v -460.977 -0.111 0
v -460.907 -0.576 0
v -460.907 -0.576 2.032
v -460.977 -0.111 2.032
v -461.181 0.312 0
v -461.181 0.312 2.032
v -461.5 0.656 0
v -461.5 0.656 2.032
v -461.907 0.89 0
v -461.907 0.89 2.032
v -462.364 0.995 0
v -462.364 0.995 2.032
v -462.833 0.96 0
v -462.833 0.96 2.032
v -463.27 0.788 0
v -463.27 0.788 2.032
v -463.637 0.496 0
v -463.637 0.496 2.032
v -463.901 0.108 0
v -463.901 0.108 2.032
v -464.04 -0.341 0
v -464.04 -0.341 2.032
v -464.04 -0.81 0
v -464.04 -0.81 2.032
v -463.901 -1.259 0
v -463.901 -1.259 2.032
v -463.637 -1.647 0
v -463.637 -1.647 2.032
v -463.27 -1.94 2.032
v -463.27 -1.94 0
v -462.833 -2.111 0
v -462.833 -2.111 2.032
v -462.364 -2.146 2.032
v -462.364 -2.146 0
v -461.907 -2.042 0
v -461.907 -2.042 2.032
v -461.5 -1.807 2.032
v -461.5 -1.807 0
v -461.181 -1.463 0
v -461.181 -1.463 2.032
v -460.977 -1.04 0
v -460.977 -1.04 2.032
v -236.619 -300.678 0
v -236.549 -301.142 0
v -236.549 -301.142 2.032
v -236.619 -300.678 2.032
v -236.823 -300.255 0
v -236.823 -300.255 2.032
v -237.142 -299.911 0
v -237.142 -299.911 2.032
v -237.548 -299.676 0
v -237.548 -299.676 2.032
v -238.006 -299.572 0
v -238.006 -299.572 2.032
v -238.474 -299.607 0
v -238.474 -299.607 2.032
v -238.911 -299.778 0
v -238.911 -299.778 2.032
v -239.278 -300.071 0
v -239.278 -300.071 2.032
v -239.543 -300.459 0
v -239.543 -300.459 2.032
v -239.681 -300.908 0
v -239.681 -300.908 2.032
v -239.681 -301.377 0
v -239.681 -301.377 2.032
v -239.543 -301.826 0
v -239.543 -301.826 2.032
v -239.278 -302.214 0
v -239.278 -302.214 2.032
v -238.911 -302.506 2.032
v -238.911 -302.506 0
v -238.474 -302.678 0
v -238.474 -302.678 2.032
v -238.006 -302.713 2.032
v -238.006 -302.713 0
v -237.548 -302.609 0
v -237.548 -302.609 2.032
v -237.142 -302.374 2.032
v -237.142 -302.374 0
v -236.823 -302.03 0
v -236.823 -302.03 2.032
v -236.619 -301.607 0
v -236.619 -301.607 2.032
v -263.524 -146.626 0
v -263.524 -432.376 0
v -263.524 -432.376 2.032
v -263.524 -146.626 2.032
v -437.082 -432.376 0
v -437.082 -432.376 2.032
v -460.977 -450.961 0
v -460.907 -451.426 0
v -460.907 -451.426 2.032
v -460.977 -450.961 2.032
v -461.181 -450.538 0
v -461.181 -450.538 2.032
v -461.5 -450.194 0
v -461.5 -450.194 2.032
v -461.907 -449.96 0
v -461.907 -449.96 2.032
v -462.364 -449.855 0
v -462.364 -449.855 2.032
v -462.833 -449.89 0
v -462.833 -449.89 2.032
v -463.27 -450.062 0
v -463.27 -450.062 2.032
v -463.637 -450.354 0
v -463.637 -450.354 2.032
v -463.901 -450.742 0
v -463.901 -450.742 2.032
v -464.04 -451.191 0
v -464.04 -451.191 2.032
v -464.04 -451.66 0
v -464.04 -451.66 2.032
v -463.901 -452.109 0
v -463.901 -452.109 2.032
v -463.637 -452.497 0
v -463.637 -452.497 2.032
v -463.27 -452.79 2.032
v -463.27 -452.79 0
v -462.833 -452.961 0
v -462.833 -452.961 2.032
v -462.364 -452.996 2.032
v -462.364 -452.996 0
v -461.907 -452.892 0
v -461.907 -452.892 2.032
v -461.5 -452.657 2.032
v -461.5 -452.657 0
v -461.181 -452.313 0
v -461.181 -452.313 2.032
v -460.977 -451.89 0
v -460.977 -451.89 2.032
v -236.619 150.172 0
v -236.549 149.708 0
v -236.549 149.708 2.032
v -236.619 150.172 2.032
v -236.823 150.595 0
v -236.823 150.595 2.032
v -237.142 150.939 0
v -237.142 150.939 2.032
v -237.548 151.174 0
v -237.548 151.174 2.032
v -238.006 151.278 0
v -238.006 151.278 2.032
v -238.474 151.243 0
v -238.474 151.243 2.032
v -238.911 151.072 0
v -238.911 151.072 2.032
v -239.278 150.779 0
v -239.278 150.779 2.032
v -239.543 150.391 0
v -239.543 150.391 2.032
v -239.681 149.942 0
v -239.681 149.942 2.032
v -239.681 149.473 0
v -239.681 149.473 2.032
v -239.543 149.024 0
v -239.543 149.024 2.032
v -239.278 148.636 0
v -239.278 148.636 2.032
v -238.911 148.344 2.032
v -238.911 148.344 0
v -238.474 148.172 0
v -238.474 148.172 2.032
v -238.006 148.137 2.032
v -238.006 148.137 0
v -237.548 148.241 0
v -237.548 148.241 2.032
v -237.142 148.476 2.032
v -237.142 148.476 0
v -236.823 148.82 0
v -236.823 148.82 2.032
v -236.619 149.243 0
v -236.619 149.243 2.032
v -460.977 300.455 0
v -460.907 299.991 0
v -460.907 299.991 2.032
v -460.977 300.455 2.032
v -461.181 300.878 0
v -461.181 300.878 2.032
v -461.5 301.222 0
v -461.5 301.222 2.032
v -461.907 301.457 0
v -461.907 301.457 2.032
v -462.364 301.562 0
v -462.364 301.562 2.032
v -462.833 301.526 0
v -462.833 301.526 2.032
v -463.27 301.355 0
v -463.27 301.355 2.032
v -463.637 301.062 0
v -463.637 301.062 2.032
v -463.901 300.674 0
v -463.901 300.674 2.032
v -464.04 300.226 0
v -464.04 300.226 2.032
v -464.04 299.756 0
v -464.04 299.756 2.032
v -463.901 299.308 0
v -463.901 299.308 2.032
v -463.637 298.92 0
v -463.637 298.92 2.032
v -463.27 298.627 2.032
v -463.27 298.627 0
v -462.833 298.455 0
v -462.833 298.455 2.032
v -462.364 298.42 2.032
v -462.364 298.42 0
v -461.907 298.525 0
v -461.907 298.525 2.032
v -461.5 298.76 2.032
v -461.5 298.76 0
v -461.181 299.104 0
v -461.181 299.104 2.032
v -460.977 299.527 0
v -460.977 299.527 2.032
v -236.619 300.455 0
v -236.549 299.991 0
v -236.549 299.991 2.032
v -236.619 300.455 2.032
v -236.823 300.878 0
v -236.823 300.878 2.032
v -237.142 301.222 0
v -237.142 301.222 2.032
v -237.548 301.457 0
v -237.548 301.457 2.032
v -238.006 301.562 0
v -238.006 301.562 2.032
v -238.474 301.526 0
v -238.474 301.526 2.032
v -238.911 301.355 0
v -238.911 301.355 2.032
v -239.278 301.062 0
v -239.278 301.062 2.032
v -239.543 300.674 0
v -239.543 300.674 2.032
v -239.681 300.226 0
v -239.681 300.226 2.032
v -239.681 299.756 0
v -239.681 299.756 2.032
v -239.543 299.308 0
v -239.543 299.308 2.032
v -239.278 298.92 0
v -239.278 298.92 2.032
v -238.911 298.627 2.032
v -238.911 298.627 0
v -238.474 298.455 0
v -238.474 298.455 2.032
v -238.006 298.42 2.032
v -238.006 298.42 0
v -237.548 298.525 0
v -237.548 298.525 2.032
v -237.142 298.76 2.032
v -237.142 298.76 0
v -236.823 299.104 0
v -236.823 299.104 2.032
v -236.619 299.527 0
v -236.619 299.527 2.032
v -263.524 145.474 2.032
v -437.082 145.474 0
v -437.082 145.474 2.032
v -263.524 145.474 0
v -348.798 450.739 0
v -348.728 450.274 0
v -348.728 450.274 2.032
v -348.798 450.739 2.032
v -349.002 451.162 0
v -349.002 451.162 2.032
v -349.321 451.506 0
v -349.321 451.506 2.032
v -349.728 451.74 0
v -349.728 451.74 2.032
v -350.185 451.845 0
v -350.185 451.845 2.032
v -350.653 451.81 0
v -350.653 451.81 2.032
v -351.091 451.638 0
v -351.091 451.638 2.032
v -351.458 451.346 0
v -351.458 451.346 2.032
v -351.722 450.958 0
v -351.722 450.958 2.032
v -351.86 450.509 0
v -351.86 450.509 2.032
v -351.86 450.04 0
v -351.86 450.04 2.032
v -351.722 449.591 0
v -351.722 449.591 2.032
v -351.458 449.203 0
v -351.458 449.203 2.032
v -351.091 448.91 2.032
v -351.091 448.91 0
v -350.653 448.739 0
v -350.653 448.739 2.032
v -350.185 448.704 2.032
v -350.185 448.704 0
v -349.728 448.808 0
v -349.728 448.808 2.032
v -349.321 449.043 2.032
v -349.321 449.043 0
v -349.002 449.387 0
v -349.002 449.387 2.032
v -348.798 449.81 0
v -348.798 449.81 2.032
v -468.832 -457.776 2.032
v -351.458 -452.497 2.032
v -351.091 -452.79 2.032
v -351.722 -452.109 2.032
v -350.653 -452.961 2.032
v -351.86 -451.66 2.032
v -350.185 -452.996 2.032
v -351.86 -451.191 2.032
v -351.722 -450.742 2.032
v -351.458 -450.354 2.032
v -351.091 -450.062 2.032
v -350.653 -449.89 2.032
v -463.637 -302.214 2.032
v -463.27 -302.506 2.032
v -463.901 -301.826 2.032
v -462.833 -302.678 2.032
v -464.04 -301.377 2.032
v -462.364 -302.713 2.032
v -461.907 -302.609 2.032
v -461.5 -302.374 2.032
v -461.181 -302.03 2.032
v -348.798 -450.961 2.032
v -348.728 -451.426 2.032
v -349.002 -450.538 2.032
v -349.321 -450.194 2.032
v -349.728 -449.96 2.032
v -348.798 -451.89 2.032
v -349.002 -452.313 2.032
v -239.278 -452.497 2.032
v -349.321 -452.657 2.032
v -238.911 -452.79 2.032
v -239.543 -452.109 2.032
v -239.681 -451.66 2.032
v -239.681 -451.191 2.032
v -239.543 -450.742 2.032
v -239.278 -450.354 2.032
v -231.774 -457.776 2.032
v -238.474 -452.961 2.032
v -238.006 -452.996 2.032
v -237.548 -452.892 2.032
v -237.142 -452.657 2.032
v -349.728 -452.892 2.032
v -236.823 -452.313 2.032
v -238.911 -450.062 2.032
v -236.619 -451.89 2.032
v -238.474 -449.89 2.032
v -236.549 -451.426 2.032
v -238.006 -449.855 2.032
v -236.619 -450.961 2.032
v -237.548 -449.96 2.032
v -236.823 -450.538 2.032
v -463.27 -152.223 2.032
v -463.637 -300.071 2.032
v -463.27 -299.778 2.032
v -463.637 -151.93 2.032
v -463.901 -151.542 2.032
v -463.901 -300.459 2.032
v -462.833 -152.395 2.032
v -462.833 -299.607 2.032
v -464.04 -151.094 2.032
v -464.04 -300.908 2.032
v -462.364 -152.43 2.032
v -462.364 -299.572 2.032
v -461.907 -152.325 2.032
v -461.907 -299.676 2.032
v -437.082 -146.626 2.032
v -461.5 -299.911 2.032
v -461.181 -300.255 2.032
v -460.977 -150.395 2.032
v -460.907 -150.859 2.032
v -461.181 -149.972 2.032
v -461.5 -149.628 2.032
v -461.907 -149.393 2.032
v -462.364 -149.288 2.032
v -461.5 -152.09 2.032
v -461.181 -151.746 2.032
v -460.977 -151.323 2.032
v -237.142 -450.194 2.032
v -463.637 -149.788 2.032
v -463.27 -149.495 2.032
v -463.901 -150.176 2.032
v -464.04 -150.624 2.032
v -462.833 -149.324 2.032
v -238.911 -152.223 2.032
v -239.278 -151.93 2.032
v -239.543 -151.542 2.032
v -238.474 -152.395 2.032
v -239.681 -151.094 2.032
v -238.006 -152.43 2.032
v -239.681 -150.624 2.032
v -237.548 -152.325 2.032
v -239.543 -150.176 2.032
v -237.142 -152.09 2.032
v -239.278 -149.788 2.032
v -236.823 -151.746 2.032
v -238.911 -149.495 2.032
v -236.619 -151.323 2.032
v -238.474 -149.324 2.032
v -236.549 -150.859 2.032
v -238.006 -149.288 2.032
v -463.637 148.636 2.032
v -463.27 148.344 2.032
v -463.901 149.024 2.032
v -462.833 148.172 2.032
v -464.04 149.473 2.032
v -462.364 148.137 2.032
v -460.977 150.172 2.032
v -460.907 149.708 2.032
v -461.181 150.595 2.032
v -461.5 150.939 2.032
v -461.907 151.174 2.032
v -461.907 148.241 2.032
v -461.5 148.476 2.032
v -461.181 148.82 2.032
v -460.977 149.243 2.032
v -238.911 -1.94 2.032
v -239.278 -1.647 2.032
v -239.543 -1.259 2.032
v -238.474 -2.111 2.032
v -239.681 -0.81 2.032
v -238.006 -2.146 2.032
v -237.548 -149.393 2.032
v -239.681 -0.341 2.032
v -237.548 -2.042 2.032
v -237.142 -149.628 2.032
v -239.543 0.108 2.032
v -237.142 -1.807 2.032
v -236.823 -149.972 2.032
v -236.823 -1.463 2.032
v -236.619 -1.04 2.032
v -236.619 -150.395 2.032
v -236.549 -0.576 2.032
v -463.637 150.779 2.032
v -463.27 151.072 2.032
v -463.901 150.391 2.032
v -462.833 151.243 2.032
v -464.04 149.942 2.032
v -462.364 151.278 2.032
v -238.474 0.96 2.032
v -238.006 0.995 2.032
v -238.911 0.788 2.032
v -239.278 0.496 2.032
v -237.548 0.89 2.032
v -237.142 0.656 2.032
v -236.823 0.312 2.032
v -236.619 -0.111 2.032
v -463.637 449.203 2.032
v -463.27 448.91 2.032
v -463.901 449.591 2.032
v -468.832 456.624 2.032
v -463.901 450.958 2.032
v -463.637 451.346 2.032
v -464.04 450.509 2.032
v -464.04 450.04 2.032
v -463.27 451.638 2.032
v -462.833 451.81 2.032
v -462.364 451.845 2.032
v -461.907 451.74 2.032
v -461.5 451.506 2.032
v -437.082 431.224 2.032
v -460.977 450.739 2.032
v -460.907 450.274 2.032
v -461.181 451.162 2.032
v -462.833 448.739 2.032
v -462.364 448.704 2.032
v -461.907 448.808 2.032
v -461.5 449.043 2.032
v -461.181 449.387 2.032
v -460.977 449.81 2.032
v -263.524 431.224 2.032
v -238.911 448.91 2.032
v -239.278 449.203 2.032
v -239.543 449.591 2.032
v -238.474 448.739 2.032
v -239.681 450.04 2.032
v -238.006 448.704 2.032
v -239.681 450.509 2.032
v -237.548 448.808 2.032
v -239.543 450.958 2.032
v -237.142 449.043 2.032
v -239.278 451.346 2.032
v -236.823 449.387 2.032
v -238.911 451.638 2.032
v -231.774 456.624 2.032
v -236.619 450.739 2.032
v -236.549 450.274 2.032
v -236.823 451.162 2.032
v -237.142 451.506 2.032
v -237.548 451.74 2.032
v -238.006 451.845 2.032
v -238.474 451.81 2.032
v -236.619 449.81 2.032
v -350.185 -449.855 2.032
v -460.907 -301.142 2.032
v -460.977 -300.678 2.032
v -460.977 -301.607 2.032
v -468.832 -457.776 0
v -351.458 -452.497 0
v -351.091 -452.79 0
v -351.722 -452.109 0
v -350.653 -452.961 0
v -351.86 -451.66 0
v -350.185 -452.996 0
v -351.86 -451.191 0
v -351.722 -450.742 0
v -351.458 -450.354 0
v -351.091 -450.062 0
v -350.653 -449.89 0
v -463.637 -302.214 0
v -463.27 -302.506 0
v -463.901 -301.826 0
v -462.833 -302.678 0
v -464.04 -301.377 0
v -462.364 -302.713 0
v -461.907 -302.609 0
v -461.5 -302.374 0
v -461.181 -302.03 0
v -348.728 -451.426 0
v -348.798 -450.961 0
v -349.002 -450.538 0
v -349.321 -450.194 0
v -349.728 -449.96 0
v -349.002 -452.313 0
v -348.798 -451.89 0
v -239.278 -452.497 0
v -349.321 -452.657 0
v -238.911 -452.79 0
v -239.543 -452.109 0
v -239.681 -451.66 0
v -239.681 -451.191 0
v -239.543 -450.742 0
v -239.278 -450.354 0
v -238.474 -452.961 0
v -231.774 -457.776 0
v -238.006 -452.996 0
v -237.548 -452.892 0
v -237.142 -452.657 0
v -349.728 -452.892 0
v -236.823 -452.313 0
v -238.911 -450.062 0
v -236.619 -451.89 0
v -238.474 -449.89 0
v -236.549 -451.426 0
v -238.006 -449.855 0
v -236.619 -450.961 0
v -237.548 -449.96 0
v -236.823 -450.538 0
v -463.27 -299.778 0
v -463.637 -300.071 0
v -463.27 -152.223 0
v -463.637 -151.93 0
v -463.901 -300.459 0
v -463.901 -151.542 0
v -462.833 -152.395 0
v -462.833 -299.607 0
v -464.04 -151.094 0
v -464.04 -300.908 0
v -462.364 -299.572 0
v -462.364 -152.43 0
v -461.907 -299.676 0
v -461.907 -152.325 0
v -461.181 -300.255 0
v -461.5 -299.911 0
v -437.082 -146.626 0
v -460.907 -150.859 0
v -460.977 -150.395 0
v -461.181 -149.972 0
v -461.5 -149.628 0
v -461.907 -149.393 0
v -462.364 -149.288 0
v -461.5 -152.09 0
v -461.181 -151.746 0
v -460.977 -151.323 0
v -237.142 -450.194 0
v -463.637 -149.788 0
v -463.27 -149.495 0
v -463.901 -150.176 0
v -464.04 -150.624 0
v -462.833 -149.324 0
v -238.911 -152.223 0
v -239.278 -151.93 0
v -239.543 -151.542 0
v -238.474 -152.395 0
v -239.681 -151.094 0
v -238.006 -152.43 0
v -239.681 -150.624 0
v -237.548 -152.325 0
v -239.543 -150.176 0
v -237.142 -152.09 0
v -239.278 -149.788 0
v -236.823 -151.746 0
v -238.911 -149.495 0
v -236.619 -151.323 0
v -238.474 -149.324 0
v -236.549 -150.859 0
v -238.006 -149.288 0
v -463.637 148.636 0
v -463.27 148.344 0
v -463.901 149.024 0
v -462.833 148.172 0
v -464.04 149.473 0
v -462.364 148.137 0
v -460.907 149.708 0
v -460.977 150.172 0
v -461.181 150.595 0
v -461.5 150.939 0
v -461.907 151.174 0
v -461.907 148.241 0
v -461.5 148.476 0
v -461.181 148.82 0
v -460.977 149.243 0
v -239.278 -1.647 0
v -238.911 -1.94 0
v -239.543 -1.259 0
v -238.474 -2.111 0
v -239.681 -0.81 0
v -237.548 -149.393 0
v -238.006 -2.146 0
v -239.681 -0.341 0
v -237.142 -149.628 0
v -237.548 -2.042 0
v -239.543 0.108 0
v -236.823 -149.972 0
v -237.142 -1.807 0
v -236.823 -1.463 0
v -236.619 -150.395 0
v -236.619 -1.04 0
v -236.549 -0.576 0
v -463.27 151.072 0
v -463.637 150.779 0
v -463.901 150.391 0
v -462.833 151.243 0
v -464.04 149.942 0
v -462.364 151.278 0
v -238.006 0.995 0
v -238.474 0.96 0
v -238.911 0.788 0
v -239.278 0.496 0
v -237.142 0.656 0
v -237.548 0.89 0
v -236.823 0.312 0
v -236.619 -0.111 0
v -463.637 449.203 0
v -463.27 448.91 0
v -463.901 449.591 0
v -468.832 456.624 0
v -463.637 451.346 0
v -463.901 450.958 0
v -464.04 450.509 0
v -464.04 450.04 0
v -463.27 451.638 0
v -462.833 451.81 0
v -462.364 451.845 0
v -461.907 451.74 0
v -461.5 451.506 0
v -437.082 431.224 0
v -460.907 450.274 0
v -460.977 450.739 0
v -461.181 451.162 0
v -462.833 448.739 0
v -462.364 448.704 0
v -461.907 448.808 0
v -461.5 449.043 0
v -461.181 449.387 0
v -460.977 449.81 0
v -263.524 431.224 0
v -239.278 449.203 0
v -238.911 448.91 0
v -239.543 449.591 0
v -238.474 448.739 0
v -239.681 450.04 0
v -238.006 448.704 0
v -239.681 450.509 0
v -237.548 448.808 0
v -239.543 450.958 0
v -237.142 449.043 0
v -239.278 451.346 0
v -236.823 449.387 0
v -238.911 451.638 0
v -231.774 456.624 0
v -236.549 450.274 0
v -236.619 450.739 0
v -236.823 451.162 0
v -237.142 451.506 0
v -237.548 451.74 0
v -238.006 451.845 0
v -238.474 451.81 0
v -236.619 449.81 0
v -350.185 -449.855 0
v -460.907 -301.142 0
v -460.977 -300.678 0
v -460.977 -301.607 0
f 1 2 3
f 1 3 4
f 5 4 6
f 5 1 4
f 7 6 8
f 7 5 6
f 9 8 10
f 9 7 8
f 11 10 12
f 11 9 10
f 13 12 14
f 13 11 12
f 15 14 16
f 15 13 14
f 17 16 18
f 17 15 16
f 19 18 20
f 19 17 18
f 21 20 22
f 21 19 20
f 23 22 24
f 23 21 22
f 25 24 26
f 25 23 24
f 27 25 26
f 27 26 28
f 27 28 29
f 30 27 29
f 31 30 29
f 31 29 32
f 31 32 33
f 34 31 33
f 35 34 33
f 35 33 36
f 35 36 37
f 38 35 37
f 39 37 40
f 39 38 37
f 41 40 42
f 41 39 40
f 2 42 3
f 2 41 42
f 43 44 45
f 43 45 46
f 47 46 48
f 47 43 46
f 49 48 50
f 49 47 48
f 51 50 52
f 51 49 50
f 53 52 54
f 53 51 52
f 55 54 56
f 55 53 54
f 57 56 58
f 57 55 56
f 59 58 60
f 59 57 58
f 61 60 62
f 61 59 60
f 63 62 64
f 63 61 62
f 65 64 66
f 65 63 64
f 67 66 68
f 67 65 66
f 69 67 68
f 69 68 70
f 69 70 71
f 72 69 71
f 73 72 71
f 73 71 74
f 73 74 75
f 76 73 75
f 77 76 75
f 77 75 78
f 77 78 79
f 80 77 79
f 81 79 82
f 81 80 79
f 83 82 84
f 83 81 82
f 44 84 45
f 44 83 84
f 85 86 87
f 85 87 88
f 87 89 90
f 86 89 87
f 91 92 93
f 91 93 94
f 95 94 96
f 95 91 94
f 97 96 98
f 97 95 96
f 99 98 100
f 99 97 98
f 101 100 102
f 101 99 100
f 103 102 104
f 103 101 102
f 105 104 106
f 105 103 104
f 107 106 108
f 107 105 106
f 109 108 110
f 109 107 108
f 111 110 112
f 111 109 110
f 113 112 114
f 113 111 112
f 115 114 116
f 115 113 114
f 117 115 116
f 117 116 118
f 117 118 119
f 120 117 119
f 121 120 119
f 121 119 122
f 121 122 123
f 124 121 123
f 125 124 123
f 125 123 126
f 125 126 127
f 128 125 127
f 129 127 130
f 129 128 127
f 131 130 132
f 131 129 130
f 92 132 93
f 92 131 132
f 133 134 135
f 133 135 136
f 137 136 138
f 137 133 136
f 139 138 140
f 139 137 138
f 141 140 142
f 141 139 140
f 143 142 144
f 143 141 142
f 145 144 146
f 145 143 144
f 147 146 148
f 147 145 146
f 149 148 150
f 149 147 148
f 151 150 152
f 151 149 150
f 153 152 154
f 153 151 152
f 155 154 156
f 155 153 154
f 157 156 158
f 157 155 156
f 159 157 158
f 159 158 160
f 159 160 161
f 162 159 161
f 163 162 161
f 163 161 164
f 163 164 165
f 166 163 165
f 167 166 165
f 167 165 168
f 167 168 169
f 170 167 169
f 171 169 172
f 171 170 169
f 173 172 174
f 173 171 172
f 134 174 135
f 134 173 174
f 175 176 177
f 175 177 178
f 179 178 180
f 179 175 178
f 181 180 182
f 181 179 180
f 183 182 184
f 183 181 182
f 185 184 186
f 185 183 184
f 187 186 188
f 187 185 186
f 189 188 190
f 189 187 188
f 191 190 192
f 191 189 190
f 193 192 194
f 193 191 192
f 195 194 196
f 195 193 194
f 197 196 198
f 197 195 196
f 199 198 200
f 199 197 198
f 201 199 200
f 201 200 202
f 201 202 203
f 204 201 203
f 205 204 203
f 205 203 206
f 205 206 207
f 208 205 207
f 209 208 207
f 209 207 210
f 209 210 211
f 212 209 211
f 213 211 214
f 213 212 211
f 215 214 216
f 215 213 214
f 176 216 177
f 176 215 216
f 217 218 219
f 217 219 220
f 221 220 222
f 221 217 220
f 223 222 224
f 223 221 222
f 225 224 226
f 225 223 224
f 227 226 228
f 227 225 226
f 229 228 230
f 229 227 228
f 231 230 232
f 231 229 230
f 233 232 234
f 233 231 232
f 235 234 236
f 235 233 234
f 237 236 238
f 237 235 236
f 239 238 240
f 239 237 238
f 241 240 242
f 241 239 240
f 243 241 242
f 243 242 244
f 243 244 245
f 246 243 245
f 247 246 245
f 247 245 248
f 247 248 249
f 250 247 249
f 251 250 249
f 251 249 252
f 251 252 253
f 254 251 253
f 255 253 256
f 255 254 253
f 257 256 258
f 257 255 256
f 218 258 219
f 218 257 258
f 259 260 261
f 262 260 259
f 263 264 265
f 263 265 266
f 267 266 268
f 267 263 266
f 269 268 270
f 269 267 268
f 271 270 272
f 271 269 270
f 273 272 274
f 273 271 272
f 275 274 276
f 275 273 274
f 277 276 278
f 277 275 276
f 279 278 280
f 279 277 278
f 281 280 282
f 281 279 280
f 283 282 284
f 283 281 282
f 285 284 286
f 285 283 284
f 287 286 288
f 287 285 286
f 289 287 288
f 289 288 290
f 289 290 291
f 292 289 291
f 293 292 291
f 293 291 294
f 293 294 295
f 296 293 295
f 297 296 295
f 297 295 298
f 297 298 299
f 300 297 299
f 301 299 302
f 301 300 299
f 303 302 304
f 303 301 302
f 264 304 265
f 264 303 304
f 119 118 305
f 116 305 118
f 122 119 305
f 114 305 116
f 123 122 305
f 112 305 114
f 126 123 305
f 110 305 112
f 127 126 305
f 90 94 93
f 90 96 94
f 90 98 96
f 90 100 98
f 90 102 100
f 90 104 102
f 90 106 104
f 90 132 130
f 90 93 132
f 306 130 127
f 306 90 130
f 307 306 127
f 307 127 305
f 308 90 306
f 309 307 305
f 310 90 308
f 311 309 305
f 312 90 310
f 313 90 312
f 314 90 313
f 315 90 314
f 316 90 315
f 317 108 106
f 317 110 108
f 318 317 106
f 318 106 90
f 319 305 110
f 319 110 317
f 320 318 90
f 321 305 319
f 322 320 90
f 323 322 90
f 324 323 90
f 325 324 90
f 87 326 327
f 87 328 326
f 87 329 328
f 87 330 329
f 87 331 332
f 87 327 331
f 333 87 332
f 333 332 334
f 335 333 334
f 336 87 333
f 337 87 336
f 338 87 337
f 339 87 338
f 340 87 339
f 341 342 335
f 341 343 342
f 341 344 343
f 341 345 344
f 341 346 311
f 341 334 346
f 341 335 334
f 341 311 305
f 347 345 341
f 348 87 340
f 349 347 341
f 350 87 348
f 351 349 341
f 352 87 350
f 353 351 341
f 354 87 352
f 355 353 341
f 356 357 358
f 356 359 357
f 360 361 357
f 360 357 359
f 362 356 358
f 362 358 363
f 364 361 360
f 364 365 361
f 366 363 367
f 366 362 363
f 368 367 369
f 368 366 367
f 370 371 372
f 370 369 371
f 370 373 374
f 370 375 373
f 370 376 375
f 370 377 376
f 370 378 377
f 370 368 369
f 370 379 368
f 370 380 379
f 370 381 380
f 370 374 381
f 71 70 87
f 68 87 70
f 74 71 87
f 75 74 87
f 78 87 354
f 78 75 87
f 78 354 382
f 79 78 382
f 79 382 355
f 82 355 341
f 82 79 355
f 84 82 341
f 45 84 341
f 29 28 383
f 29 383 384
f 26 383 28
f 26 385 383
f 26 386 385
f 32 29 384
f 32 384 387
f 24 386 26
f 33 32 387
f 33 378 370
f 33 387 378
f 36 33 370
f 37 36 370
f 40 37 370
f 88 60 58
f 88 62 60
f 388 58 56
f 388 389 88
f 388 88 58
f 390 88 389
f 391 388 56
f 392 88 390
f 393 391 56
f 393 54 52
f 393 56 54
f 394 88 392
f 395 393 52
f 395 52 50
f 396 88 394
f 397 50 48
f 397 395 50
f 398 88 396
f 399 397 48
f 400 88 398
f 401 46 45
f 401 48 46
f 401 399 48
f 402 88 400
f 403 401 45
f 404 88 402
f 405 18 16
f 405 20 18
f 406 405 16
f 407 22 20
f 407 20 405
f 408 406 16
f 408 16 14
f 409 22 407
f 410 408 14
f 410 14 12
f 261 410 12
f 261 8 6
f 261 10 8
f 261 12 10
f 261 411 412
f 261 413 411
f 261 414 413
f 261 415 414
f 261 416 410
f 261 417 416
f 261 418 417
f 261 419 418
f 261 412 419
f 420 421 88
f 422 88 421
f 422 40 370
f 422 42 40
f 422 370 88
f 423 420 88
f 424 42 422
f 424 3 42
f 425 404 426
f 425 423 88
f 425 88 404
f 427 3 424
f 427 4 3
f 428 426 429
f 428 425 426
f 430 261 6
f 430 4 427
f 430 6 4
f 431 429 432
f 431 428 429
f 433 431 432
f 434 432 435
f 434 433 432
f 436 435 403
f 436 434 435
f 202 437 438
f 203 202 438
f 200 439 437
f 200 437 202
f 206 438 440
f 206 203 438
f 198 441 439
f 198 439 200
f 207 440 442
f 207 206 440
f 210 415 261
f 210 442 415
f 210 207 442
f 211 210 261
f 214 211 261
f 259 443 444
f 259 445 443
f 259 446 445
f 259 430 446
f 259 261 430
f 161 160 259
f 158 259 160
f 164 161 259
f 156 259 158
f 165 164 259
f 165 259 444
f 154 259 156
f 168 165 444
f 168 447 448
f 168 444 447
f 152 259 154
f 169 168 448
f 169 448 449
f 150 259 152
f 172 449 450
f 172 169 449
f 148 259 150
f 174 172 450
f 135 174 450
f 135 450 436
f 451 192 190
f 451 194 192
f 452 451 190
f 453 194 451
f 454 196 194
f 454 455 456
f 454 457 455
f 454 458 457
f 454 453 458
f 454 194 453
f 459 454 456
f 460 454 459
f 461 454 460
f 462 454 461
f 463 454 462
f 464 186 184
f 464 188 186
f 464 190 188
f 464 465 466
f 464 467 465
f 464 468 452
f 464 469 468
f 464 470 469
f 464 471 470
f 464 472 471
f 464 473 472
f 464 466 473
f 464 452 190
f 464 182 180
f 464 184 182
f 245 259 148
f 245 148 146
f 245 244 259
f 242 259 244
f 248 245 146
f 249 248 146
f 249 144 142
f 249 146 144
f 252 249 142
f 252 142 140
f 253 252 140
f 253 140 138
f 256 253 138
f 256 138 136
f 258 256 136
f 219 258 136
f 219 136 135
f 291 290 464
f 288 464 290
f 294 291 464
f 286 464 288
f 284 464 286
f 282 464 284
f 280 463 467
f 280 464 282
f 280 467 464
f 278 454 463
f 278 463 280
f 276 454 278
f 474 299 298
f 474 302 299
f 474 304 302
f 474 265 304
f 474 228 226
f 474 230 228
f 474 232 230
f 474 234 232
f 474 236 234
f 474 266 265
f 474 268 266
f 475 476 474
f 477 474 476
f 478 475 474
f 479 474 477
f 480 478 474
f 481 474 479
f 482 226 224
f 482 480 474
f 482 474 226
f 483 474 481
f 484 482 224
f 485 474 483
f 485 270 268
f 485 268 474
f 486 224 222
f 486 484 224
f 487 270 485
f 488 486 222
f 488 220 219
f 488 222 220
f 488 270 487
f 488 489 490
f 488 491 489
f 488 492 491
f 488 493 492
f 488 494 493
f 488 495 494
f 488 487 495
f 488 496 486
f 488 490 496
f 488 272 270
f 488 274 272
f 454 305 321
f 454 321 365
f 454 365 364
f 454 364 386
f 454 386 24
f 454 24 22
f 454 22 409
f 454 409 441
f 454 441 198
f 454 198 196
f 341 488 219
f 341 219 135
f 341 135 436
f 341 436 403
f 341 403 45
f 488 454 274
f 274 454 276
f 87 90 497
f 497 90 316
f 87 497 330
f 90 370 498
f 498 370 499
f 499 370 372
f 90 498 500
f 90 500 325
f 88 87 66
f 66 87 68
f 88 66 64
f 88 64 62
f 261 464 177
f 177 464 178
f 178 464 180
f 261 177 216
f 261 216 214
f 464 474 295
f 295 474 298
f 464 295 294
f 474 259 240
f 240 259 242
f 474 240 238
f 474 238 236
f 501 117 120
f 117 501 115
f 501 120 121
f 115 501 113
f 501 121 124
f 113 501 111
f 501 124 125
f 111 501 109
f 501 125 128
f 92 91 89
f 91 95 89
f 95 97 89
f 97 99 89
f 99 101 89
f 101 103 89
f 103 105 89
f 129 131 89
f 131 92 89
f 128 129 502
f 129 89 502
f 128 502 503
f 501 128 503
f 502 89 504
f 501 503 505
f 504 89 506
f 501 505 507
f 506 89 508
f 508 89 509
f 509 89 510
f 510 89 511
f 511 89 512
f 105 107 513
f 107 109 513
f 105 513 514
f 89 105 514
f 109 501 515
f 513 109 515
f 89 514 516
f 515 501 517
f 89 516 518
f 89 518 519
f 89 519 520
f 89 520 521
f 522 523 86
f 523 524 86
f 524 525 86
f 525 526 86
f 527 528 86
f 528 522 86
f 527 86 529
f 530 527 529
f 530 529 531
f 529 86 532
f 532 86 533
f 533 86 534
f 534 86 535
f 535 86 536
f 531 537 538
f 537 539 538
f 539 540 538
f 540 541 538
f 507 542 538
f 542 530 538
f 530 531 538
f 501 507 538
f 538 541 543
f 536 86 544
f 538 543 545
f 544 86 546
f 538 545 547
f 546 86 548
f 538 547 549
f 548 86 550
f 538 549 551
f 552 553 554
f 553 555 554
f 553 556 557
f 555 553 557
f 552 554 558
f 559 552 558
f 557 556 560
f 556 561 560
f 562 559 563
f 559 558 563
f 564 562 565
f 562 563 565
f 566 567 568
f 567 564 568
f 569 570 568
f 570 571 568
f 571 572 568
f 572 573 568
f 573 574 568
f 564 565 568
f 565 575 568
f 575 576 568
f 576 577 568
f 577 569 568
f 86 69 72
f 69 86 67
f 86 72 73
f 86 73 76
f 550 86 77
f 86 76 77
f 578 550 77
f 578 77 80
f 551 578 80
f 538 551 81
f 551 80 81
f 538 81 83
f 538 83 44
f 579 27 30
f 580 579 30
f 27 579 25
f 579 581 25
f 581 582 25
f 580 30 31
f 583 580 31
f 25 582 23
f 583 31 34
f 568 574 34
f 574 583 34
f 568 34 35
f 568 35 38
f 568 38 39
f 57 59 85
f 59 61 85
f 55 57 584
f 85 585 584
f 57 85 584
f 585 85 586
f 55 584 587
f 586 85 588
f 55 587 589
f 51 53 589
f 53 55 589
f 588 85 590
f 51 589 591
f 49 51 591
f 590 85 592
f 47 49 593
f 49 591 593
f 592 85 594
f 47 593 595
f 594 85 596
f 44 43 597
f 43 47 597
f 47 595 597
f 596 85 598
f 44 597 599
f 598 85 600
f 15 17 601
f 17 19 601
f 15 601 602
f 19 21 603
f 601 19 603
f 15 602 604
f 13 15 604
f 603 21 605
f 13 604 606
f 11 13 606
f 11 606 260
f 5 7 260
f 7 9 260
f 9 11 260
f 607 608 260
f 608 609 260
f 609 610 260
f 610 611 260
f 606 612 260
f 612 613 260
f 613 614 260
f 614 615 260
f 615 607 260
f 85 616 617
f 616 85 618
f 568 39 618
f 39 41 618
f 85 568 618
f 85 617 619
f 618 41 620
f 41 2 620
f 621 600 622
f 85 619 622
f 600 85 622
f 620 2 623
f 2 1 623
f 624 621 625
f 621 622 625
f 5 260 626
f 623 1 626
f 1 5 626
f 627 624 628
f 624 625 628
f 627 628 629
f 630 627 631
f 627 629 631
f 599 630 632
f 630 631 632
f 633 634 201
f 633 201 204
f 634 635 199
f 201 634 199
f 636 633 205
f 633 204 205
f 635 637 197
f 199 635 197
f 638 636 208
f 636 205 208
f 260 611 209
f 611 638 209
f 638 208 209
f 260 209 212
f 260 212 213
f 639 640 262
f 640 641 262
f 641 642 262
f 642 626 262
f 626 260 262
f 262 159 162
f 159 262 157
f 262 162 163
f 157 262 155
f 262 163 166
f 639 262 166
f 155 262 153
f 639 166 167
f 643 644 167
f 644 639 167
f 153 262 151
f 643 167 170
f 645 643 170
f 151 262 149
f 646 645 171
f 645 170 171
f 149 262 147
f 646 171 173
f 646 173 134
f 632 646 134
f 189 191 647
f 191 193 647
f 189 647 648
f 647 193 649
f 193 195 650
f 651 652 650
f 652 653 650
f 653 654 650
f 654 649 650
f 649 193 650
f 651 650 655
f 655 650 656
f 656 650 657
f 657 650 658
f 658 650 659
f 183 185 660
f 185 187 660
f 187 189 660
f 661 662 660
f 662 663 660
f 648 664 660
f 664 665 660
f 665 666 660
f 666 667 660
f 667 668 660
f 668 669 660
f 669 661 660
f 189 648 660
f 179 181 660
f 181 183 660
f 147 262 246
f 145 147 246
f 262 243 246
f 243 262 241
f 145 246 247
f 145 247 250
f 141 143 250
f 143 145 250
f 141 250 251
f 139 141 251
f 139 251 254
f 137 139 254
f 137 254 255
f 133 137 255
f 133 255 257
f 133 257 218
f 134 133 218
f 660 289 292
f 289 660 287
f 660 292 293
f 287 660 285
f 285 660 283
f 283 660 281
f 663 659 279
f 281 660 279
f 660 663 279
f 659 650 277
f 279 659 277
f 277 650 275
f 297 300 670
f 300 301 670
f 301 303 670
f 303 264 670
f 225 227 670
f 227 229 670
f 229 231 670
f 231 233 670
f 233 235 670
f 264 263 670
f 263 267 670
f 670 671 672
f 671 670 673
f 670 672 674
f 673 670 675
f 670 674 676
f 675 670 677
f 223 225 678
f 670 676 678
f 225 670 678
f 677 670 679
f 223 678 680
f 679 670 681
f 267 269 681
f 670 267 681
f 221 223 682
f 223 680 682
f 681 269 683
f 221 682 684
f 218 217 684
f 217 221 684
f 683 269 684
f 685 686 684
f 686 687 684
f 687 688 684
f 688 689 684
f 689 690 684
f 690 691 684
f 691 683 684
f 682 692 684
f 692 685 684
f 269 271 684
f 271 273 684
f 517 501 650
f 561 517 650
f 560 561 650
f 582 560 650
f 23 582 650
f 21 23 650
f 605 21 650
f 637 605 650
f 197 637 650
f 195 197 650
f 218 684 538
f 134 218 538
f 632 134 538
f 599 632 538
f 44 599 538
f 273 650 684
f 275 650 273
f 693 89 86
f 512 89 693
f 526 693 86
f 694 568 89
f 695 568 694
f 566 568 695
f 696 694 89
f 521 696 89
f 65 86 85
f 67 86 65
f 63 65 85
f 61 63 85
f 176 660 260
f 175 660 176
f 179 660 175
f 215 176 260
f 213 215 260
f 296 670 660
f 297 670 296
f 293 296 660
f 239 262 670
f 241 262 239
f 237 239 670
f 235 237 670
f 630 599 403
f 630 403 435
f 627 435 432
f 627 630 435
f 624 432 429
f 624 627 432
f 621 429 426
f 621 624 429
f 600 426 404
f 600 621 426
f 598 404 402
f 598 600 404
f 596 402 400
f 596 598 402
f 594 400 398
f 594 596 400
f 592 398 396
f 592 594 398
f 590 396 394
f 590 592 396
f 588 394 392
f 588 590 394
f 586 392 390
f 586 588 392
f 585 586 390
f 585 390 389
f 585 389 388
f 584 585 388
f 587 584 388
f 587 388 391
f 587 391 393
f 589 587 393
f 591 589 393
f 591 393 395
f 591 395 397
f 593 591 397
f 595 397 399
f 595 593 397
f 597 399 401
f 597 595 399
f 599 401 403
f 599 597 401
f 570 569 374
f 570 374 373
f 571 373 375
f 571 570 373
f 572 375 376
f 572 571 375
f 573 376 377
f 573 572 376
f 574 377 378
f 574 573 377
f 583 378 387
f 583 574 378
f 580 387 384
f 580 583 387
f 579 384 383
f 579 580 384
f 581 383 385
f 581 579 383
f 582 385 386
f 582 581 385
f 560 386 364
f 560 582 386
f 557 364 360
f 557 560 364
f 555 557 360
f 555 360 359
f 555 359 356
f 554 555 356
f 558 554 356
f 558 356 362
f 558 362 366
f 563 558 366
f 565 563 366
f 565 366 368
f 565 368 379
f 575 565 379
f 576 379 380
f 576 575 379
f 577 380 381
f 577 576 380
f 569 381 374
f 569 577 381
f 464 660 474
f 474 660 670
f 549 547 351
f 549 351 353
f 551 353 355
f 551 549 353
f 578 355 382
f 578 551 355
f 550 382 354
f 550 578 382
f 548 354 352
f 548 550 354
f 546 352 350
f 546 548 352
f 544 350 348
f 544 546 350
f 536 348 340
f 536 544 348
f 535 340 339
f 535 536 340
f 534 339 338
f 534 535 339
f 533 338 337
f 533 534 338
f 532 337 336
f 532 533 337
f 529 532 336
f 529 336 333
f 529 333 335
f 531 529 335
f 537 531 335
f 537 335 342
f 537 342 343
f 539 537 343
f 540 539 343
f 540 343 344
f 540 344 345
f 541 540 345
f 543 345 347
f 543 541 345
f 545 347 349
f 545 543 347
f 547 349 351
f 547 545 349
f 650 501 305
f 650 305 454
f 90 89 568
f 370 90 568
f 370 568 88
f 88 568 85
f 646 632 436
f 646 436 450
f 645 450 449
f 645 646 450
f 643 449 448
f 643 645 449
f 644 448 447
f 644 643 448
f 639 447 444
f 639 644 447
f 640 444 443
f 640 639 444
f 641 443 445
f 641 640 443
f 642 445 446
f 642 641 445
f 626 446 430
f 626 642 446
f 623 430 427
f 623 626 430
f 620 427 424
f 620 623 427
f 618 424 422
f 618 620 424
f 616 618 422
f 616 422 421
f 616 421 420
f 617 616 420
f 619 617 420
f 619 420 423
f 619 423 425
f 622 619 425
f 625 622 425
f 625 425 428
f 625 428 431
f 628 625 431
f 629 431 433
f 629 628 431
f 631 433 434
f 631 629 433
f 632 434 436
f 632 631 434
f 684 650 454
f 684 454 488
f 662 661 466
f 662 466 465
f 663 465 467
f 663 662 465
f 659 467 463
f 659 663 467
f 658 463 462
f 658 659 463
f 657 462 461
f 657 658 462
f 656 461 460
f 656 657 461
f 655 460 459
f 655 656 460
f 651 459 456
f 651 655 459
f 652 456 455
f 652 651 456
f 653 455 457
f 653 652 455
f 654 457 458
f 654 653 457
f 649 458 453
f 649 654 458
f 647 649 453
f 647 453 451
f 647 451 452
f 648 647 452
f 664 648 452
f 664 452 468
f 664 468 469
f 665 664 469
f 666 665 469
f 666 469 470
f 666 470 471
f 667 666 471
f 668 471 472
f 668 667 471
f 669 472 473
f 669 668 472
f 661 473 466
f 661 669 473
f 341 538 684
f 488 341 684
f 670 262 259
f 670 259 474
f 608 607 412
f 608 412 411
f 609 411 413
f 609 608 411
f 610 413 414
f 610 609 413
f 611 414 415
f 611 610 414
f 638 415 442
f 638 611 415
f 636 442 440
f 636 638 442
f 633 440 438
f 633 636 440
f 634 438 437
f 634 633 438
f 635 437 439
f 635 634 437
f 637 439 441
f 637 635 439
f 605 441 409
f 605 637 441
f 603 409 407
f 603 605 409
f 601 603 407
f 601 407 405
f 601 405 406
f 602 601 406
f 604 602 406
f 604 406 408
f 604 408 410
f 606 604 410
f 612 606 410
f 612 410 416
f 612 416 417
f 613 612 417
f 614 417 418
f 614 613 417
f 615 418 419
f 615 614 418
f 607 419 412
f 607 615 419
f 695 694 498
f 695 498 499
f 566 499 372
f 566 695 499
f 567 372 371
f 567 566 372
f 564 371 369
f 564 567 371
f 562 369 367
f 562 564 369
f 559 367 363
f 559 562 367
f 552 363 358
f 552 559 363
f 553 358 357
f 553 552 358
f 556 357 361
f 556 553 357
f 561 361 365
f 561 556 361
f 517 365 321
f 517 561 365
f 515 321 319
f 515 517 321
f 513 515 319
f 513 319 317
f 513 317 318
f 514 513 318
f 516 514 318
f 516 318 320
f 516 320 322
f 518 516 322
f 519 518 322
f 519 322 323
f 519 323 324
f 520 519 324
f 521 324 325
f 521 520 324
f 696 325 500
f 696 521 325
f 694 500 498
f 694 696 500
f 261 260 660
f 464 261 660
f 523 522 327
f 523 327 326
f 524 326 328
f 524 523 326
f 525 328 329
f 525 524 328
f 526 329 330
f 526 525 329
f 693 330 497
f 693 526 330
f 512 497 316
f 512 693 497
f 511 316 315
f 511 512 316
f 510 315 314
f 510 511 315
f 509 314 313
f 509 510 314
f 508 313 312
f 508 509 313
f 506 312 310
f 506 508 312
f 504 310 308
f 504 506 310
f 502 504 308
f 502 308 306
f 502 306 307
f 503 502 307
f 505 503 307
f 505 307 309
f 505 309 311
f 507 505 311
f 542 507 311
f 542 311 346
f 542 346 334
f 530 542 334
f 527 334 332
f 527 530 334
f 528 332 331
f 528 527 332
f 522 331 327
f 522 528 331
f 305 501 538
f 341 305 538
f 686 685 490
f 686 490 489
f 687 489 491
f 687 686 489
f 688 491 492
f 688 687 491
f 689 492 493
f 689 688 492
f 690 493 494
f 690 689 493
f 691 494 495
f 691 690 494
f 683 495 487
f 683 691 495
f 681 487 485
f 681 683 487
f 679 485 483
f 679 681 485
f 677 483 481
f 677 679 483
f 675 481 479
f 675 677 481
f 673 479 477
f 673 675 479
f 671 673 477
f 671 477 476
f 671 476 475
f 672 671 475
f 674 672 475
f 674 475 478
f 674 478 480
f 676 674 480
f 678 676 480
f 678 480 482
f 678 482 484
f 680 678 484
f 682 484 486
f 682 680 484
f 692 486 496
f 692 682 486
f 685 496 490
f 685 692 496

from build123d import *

# Parameters (mm, degrees)
F0_W     = 237.0582
F0_H     = 914.4
F0_R     = 1.575
F0_W_2   = 173.5582
F0_H_2   = 285.75
F1_DEPTH = 2.032


with BuildPart() as f1:
    # F0 (on Top) → F1 (new body)
    with BuildSketch(Plane.XY):
        with Locations((-350.303008, -0.575709)):
            Rectangle(F0_W, F0_H)
        with Locations((-462.482108, -451.425709)):
            Circle(F0_R, mode=Mode.SUBTRACT)
        with Locations((-462.482108, -301.142376)):
            Circle(F0_R, mode=Mode.SUBTRACT)
        with Locations((-462.482108, -150.859042)):
            Circle(F0_R, mode=Mode.SUBTRACT)
        with Locations((-350.303008, -451.425709)):
            Circle(F0_R, mode=Mode.SUBTRACT)
        with Locations((-350.303008, -289.500709)):
            Rectangle(F0_W_2, F0_H_2, mode=Mode.SUBTRACT)
        with Locations((-238.123908, -451.425709)):
            Circle(F0_R, mode=Mode.SUBTRACT)
        with Locations((-238.123908, -301.142376)):
            Circle(F0_R, mode=Mode.SUBTRACT)
        with Locations((-238.123908, -150.859042)):
            Circle(F0_R, mode=Mode.SUBTRACT)
        with Locations((-462.482108, -0.575709)):
            Circle(F0_R, mode=Mode.SUBTRACT)
        with Locations((-462.482108, 149.707624)):
            Circle(F0_R, mode=Mode.SUBTRACT)
        with Locations((-462.482108, 299.990958)):
            Circle(F0_R, mode=Mode.SUBTRACT)
        with Locations((-462.482108, 450.274291)):
            Circle(F0_R, mode=Mode.SUBTRACT)
        with Locations((-238.123908, -0.575709)):
            Circle(F0_R, mode=Mode.SUBTRACT)
        with Locations((-238.123908, 149.707624)):
            Circle(F0_R, mode=Mode.SUBTRACT)
        with Locations((-350.303008, 288.349291)):
            Rectangle(F0_W_2, F0_H_2, mode=Mode.SUBTRACT)
        with Locations((-350.303008, 450.274291)):
            Circle(F0_R, mode=Mode.SUBTRACT)
        with Locations((-238.123908, 299.990958)):
            Circle(F0_R, mode=Mode.SUBTRACT)
        with Locations((-238.123908, 450.274291)):
            Circle(F0_R, mode=Mode.SUBTRACT)
    extrude(amount=F1_DEPTH)


solid = f1.part
